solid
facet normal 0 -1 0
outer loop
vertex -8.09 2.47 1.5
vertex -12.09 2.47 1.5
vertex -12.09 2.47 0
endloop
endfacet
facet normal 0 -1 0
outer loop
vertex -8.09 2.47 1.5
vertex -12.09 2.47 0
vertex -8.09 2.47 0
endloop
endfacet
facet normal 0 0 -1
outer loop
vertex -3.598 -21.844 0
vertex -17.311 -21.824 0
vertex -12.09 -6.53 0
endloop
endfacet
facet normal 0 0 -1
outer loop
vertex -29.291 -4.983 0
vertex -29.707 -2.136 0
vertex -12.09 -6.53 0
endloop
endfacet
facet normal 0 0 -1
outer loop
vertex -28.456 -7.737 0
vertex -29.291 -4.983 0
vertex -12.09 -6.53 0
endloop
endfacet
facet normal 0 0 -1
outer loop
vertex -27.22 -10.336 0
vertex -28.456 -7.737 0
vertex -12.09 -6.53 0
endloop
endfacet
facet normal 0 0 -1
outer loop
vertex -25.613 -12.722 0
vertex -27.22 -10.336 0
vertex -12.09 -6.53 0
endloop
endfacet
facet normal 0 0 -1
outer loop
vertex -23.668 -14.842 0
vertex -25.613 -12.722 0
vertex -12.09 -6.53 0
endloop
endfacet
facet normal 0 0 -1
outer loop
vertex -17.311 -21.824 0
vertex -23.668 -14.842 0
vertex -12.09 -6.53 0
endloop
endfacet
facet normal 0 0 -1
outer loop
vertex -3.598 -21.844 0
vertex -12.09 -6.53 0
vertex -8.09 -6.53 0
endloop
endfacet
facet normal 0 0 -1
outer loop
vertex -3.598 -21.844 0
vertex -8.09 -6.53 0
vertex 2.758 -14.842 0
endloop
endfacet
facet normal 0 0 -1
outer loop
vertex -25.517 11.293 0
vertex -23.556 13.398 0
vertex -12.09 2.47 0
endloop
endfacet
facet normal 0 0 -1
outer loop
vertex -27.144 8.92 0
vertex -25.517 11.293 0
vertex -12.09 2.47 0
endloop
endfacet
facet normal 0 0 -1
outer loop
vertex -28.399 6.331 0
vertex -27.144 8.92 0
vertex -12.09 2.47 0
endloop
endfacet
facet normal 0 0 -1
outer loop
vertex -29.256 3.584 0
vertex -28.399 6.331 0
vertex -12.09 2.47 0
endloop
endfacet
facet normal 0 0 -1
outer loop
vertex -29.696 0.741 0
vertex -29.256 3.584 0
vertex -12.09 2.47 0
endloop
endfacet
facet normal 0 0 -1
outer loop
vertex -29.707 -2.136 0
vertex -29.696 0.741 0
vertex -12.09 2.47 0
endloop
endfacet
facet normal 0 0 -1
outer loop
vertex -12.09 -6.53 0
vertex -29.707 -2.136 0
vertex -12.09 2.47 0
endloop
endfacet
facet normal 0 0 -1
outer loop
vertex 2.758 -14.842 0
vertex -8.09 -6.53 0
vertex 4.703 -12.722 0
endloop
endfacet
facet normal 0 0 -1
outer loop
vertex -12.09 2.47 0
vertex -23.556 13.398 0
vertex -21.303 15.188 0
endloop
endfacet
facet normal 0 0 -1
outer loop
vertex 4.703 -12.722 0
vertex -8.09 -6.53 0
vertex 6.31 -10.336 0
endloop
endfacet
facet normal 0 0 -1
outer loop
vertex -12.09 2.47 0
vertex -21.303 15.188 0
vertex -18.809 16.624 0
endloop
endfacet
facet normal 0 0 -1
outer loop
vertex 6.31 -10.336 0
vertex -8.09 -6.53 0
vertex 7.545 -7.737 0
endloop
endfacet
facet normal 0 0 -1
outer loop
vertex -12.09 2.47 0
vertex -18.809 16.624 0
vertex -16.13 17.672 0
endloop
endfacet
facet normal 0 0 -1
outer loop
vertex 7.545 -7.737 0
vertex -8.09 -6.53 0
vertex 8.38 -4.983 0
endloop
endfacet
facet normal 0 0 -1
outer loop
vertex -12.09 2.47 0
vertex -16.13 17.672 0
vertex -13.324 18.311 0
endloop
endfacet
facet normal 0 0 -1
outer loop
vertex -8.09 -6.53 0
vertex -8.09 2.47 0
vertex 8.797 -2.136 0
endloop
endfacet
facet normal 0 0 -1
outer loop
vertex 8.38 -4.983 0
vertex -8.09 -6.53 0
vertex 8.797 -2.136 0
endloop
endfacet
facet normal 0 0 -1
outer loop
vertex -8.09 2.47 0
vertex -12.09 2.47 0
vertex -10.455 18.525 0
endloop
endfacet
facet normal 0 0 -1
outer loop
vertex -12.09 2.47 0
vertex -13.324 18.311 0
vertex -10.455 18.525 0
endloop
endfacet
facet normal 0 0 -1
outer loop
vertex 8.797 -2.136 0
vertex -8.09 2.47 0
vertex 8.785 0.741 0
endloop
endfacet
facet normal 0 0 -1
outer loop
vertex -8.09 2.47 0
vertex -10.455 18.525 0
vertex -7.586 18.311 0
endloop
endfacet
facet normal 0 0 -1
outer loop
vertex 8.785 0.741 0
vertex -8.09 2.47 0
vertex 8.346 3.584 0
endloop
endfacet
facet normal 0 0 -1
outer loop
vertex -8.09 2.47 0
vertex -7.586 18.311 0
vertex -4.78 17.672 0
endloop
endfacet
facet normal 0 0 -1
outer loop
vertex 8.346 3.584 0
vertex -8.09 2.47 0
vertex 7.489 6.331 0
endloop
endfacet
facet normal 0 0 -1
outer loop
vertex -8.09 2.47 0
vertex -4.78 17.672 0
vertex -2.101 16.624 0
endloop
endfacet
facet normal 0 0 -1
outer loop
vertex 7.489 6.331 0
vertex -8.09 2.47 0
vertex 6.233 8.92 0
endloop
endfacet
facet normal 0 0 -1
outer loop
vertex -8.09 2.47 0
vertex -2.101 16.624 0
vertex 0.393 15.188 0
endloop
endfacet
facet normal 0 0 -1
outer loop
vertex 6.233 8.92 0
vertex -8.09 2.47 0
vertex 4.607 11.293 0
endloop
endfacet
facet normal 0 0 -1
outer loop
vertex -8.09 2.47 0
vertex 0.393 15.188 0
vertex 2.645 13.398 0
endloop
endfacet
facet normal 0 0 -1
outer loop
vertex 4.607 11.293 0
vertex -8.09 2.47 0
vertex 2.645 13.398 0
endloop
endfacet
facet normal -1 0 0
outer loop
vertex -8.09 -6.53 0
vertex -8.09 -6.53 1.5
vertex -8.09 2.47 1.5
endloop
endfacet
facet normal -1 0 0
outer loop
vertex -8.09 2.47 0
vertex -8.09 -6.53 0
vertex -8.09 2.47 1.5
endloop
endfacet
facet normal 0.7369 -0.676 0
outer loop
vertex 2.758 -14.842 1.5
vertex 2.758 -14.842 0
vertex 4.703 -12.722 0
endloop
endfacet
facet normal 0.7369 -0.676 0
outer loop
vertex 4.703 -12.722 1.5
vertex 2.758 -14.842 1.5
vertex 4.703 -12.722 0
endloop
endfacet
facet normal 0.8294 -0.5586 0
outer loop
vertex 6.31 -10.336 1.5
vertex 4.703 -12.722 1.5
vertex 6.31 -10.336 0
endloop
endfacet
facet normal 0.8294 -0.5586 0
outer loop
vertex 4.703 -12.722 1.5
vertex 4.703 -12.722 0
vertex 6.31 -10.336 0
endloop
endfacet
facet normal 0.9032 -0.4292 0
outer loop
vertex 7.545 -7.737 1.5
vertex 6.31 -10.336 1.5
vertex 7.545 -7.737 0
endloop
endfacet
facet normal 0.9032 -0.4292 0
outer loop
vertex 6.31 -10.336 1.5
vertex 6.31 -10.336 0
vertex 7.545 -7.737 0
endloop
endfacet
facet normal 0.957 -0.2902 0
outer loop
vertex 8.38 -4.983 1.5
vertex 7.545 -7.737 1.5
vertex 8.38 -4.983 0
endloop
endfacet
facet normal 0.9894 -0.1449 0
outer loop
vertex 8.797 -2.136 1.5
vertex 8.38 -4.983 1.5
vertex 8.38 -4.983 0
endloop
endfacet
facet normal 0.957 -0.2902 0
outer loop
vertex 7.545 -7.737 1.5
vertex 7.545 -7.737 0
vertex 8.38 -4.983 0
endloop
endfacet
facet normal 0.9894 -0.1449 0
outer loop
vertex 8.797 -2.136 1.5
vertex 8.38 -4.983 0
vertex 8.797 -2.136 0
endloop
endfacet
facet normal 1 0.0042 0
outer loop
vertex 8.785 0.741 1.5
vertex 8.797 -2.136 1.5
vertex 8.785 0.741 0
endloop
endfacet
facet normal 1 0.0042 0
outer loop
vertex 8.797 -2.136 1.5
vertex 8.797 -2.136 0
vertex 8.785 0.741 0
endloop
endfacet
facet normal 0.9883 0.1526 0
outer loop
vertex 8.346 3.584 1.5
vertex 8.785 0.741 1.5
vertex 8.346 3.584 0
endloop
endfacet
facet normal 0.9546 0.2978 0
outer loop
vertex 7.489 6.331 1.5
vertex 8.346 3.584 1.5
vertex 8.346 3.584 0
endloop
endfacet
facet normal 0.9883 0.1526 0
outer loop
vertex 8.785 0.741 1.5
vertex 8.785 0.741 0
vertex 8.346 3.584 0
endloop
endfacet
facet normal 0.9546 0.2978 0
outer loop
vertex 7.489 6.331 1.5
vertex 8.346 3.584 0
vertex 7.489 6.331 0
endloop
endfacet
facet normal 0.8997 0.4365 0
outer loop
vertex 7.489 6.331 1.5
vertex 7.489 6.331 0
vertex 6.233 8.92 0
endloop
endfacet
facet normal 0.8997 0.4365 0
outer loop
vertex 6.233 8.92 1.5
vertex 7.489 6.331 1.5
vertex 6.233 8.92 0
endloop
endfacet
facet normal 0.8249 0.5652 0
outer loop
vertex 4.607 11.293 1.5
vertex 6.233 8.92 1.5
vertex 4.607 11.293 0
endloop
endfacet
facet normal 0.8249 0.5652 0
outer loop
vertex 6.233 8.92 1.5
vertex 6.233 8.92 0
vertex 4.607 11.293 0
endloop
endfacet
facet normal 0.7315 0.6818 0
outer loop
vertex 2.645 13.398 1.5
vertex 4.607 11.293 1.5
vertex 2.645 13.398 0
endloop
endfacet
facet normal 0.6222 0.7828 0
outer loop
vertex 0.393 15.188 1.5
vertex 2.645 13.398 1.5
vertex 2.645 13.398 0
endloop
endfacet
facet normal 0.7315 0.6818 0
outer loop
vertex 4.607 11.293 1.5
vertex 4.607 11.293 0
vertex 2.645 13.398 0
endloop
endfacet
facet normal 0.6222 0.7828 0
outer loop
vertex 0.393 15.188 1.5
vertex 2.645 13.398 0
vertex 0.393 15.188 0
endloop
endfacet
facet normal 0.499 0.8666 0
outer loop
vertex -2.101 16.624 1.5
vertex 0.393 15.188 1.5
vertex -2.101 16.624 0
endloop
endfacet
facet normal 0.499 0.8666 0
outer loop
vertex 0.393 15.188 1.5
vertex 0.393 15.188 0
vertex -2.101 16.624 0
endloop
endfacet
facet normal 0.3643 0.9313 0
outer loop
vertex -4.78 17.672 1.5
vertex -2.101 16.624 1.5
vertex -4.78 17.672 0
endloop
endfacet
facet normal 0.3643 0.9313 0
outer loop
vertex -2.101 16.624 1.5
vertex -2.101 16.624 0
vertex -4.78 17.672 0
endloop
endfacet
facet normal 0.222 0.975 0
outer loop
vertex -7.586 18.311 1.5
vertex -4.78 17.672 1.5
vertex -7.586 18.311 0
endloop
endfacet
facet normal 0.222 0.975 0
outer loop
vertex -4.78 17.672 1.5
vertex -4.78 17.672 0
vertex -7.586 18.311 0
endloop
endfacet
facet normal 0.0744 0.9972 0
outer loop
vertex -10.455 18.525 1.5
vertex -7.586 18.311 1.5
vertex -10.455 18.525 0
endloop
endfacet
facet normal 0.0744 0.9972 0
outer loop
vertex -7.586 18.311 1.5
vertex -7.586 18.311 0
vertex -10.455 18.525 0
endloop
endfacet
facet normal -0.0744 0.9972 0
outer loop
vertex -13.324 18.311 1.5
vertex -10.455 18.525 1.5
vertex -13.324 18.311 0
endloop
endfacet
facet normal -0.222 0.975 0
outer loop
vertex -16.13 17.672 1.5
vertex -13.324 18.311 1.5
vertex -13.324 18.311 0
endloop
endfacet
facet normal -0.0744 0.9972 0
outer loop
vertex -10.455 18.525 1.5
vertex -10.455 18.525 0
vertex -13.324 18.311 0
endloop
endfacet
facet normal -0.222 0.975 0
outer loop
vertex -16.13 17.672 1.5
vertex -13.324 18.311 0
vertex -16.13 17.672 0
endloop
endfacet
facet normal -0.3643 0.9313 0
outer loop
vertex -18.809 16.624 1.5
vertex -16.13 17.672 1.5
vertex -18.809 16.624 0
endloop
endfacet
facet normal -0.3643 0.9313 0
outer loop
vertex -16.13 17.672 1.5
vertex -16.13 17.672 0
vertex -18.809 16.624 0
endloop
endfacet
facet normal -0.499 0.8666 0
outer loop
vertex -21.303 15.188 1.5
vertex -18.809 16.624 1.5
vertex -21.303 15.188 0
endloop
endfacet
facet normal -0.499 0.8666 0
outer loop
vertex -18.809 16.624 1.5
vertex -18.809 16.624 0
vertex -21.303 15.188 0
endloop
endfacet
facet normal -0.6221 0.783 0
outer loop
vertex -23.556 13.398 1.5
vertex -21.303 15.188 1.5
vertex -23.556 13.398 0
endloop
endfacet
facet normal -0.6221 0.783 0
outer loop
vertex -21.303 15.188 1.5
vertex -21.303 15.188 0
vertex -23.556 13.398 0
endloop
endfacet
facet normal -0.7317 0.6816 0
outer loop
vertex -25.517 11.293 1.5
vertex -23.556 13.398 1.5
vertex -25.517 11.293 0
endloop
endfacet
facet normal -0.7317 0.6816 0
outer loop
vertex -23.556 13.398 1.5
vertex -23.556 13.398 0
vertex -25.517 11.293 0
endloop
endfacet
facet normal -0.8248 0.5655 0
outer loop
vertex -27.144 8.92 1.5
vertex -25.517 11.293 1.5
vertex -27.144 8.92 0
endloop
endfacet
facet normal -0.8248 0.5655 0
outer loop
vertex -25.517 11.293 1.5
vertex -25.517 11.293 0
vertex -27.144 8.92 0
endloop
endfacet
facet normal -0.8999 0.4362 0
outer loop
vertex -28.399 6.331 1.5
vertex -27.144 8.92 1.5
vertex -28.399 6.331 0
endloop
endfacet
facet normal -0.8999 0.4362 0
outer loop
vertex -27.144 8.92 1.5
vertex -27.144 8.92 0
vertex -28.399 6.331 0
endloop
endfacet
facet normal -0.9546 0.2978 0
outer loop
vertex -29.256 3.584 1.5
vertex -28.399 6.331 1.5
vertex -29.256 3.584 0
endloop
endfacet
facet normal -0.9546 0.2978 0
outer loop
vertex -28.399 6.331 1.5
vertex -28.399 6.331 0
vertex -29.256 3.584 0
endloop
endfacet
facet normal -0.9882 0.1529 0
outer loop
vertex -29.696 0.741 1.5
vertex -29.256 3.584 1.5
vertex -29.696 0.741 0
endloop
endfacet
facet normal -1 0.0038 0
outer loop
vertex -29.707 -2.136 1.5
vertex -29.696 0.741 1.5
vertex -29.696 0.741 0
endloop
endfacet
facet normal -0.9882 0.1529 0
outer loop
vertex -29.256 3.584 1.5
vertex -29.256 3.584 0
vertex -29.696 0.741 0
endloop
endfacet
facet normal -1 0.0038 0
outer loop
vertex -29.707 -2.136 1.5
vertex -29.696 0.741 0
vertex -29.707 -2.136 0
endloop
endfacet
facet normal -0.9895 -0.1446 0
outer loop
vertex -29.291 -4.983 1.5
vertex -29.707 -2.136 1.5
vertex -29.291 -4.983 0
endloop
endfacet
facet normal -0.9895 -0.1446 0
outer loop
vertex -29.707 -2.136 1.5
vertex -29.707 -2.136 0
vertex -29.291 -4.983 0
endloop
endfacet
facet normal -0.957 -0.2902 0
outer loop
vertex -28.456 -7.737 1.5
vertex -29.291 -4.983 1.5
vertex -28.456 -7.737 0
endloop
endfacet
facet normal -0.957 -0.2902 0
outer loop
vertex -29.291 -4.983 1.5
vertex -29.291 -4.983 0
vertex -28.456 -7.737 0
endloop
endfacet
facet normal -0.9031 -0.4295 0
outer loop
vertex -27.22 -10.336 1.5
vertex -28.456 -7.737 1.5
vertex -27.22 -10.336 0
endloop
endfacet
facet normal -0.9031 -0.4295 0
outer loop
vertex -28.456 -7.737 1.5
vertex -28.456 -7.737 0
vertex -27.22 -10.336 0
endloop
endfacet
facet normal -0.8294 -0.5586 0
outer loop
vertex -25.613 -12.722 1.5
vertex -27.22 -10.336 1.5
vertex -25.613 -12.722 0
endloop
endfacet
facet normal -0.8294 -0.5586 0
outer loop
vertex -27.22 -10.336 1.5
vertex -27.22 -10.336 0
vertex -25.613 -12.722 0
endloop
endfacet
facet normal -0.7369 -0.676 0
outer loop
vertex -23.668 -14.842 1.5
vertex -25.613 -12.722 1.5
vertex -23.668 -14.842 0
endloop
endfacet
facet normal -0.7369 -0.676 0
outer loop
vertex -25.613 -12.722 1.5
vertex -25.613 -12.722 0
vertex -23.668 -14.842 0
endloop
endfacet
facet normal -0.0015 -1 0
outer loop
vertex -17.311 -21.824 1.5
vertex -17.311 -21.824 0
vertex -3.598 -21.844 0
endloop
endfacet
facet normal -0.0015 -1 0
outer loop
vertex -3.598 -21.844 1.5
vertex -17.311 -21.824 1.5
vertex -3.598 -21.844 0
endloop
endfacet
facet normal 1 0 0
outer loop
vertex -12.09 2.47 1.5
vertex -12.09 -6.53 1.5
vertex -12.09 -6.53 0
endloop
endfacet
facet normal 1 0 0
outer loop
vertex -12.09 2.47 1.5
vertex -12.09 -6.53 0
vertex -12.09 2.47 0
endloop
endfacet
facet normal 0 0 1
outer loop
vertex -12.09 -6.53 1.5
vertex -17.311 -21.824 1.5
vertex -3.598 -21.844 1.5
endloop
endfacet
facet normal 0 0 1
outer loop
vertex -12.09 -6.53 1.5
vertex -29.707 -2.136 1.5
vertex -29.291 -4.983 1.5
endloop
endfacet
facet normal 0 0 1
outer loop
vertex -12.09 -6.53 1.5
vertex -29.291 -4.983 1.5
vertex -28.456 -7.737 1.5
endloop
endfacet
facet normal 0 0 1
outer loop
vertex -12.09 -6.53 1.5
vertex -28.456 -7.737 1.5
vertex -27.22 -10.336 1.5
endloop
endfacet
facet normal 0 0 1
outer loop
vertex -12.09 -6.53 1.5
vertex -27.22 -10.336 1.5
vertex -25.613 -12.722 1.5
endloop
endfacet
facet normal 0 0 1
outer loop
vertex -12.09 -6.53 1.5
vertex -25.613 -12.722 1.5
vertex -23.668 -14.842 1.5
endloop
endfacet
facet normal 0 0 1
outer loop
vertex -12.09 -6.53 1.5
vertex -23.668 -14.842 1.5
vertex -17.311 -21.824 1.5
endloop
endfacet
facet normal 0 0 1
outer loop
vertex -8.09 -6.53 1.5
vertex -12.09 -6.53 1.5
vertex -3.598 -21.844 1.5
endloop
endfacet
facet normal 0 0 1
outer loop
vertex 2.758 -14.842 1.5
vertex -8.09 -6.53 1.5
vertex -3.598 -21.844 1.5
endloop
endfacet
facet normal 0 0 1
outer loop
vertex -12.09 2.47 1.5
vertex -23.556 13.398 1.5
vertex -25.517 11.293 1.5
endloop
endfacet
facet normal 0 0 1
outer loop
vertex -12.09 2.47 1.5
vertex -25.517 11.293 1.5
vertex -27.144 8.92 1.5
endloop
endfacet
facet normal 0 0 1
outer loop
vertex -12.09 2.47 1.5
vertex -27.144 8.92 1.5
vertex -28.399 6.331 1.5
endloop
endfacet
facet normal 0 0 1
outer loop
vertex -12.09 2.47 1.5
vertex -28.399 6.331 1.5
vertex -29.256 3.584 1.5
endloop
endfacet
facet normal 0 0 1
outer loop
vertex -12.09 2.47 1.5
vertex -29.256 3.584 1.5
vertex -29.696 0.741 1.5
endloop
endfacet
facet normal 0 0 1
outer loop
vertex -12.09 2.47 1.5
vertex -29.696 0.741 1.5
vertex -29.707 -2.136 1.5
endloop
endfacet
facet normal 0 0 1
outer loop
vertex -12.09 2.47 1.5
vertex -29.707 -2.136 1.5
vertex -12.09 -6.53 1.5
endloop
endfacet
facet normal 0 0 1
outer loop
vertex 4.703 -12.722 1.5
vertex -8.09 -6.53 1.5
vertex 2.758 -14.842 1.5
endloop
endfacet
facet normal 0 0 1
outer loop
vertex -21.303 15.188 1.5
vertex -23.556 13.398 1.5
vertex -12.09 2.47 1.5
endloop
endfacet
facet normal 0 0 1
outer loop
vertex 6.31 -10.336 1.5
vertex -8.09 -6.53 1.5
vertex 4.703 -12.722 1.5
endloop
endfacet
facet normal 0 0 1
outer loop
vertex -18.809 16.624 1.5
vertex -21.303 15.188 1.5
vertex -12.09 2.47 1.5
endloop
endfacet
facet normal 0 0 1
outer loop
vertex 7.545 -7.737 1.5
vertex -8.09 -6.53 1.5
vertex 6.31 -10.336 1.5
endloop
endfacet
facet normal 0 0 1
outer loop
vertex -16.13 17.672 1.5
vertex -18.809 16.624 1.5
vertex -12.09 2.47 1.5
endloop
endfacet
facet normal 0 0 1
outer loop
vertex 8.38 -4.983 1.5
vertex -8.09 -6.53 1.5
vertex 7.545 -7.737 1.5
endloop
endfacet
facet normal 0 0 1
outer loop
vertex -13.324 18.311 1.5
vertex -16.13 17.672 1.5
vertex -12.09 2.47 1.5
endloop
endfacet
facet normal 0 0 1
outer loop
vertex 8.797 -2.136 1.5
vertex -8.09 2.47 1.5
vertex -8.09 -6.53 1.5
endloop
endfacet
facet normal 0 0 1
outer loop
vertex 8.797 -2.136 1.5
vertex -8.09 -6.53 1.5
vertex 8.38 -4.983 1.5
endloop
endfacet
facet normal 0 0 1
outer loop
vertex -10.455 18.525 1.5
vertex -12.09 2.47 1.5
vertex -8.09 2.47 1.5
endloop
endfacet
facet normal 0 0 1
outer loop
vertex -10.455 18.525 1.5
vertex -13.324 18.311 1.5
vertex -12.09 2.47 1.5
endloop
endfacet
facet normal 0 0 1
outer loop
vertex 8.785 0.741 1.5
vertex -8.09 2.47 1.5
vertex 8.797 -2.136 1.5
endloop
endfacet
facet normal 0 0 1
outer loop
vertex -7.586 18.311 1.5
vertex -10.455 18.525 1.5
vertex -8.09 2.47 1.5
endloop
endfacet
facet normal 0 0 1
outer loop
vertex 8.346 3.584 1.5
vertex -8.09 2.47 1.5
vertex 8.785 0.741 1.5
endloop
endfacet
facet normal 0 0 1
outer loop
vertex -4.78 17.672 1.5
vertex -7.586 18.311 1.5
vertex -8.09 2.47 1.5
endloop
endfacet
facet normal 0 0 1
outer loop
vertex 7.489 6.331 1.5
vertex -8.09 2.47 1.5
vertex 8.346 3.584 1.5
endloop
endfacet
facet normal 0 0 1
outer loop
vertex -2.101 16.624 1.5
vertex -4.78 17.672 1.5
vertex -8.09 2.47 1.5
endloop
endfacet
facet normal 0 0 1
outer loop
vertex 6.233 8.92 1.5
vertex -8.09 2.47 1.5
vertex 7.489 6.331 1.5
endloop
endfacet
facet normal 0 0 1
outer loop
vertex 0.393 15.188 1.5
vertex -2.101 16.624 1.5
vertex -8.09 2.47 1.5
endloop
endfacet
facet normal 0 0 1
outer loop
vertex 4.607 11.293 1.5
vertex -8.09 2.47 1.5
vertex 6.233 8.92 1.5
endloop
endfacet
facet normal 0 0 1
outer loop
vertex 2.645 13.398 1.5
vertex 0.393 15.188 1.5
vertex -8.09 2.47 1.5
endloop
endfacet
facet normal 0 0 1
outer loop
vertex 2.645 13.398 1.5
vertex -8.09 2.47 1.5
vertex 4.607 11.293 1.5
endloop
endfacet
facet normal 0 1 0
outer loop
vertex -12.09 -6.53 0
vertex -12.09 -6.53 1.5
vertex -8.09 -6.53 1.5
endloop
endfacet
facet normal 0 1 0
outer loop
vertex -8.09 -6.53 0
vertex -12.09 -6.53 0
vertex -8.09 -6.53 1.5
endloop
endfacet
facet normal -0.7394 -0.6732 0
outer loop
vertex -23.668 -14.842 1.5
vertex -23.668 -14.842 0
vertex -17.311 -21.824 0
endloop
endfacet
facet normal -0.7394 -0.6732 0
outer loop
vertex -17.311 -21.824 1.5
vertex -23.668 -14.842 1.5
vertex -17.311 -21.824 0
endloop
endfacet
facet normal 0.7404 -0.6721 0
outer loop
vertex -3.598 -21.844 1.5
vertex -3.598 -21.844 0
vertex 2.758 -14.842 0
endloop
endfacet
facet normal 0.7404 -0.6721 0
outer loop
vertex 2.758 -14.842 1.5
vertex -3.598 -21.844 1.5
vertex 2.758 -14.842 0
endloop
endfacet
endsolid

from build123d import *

# Parameters (mm, degrees)
BOSS_EXTRUDE1_DEPTH = 1.5
CUT_EXTRUDE1_REACH  = 38.943
SKETCH2_W           = 4
SKETCH2_H           = 9


with BuildPart() as part:
    # Sketch1 → Boss-Extrude1 (new body)
    with BuildSketch(Plane.XY):
        with BuildLine():
            Line((-17.310520711, -21.823889376), (-3.597740248, -21.843555797))
            Line((-3.597740248, -21.843555797), (2.757908107, -14.842465178))
            ThreePointArc((2.757908107, -14.842465178), (-10.455115829, 18.525441507), (-23.668139764, -14.842465178))
            Line((-23.668139764, -14.842465178), (-17.310520711, -21.823889376))
        make_face()
    extrude(amount=BOSS_EXTRUDE1_DEPTH)

    # Sketch2 → Cut-Extrude1 (cut, up to next)
    with BuildSketch(Plane.XY.offset(1.5), mode=Mode.PRIVATE) as cut_extrude1_sk1:
        with Locations((-10.090473375, -2.029514736)):
            Rectangle(SKETCH2_W, SKETCH2_H)
    cut_extrude1_tool1 = extrude(cut_extrude1_sk1.sketch, amount=-CUT_EXTRUDE1_REACH, mode=Mode.PRIVATE) & part.part
    add(cut_extrude1_tool1.solids().sort_by_distance((-10.090473, -2.029515, 1.5))[0], mode=Mode.SUBTRACT)


solid = part.part
